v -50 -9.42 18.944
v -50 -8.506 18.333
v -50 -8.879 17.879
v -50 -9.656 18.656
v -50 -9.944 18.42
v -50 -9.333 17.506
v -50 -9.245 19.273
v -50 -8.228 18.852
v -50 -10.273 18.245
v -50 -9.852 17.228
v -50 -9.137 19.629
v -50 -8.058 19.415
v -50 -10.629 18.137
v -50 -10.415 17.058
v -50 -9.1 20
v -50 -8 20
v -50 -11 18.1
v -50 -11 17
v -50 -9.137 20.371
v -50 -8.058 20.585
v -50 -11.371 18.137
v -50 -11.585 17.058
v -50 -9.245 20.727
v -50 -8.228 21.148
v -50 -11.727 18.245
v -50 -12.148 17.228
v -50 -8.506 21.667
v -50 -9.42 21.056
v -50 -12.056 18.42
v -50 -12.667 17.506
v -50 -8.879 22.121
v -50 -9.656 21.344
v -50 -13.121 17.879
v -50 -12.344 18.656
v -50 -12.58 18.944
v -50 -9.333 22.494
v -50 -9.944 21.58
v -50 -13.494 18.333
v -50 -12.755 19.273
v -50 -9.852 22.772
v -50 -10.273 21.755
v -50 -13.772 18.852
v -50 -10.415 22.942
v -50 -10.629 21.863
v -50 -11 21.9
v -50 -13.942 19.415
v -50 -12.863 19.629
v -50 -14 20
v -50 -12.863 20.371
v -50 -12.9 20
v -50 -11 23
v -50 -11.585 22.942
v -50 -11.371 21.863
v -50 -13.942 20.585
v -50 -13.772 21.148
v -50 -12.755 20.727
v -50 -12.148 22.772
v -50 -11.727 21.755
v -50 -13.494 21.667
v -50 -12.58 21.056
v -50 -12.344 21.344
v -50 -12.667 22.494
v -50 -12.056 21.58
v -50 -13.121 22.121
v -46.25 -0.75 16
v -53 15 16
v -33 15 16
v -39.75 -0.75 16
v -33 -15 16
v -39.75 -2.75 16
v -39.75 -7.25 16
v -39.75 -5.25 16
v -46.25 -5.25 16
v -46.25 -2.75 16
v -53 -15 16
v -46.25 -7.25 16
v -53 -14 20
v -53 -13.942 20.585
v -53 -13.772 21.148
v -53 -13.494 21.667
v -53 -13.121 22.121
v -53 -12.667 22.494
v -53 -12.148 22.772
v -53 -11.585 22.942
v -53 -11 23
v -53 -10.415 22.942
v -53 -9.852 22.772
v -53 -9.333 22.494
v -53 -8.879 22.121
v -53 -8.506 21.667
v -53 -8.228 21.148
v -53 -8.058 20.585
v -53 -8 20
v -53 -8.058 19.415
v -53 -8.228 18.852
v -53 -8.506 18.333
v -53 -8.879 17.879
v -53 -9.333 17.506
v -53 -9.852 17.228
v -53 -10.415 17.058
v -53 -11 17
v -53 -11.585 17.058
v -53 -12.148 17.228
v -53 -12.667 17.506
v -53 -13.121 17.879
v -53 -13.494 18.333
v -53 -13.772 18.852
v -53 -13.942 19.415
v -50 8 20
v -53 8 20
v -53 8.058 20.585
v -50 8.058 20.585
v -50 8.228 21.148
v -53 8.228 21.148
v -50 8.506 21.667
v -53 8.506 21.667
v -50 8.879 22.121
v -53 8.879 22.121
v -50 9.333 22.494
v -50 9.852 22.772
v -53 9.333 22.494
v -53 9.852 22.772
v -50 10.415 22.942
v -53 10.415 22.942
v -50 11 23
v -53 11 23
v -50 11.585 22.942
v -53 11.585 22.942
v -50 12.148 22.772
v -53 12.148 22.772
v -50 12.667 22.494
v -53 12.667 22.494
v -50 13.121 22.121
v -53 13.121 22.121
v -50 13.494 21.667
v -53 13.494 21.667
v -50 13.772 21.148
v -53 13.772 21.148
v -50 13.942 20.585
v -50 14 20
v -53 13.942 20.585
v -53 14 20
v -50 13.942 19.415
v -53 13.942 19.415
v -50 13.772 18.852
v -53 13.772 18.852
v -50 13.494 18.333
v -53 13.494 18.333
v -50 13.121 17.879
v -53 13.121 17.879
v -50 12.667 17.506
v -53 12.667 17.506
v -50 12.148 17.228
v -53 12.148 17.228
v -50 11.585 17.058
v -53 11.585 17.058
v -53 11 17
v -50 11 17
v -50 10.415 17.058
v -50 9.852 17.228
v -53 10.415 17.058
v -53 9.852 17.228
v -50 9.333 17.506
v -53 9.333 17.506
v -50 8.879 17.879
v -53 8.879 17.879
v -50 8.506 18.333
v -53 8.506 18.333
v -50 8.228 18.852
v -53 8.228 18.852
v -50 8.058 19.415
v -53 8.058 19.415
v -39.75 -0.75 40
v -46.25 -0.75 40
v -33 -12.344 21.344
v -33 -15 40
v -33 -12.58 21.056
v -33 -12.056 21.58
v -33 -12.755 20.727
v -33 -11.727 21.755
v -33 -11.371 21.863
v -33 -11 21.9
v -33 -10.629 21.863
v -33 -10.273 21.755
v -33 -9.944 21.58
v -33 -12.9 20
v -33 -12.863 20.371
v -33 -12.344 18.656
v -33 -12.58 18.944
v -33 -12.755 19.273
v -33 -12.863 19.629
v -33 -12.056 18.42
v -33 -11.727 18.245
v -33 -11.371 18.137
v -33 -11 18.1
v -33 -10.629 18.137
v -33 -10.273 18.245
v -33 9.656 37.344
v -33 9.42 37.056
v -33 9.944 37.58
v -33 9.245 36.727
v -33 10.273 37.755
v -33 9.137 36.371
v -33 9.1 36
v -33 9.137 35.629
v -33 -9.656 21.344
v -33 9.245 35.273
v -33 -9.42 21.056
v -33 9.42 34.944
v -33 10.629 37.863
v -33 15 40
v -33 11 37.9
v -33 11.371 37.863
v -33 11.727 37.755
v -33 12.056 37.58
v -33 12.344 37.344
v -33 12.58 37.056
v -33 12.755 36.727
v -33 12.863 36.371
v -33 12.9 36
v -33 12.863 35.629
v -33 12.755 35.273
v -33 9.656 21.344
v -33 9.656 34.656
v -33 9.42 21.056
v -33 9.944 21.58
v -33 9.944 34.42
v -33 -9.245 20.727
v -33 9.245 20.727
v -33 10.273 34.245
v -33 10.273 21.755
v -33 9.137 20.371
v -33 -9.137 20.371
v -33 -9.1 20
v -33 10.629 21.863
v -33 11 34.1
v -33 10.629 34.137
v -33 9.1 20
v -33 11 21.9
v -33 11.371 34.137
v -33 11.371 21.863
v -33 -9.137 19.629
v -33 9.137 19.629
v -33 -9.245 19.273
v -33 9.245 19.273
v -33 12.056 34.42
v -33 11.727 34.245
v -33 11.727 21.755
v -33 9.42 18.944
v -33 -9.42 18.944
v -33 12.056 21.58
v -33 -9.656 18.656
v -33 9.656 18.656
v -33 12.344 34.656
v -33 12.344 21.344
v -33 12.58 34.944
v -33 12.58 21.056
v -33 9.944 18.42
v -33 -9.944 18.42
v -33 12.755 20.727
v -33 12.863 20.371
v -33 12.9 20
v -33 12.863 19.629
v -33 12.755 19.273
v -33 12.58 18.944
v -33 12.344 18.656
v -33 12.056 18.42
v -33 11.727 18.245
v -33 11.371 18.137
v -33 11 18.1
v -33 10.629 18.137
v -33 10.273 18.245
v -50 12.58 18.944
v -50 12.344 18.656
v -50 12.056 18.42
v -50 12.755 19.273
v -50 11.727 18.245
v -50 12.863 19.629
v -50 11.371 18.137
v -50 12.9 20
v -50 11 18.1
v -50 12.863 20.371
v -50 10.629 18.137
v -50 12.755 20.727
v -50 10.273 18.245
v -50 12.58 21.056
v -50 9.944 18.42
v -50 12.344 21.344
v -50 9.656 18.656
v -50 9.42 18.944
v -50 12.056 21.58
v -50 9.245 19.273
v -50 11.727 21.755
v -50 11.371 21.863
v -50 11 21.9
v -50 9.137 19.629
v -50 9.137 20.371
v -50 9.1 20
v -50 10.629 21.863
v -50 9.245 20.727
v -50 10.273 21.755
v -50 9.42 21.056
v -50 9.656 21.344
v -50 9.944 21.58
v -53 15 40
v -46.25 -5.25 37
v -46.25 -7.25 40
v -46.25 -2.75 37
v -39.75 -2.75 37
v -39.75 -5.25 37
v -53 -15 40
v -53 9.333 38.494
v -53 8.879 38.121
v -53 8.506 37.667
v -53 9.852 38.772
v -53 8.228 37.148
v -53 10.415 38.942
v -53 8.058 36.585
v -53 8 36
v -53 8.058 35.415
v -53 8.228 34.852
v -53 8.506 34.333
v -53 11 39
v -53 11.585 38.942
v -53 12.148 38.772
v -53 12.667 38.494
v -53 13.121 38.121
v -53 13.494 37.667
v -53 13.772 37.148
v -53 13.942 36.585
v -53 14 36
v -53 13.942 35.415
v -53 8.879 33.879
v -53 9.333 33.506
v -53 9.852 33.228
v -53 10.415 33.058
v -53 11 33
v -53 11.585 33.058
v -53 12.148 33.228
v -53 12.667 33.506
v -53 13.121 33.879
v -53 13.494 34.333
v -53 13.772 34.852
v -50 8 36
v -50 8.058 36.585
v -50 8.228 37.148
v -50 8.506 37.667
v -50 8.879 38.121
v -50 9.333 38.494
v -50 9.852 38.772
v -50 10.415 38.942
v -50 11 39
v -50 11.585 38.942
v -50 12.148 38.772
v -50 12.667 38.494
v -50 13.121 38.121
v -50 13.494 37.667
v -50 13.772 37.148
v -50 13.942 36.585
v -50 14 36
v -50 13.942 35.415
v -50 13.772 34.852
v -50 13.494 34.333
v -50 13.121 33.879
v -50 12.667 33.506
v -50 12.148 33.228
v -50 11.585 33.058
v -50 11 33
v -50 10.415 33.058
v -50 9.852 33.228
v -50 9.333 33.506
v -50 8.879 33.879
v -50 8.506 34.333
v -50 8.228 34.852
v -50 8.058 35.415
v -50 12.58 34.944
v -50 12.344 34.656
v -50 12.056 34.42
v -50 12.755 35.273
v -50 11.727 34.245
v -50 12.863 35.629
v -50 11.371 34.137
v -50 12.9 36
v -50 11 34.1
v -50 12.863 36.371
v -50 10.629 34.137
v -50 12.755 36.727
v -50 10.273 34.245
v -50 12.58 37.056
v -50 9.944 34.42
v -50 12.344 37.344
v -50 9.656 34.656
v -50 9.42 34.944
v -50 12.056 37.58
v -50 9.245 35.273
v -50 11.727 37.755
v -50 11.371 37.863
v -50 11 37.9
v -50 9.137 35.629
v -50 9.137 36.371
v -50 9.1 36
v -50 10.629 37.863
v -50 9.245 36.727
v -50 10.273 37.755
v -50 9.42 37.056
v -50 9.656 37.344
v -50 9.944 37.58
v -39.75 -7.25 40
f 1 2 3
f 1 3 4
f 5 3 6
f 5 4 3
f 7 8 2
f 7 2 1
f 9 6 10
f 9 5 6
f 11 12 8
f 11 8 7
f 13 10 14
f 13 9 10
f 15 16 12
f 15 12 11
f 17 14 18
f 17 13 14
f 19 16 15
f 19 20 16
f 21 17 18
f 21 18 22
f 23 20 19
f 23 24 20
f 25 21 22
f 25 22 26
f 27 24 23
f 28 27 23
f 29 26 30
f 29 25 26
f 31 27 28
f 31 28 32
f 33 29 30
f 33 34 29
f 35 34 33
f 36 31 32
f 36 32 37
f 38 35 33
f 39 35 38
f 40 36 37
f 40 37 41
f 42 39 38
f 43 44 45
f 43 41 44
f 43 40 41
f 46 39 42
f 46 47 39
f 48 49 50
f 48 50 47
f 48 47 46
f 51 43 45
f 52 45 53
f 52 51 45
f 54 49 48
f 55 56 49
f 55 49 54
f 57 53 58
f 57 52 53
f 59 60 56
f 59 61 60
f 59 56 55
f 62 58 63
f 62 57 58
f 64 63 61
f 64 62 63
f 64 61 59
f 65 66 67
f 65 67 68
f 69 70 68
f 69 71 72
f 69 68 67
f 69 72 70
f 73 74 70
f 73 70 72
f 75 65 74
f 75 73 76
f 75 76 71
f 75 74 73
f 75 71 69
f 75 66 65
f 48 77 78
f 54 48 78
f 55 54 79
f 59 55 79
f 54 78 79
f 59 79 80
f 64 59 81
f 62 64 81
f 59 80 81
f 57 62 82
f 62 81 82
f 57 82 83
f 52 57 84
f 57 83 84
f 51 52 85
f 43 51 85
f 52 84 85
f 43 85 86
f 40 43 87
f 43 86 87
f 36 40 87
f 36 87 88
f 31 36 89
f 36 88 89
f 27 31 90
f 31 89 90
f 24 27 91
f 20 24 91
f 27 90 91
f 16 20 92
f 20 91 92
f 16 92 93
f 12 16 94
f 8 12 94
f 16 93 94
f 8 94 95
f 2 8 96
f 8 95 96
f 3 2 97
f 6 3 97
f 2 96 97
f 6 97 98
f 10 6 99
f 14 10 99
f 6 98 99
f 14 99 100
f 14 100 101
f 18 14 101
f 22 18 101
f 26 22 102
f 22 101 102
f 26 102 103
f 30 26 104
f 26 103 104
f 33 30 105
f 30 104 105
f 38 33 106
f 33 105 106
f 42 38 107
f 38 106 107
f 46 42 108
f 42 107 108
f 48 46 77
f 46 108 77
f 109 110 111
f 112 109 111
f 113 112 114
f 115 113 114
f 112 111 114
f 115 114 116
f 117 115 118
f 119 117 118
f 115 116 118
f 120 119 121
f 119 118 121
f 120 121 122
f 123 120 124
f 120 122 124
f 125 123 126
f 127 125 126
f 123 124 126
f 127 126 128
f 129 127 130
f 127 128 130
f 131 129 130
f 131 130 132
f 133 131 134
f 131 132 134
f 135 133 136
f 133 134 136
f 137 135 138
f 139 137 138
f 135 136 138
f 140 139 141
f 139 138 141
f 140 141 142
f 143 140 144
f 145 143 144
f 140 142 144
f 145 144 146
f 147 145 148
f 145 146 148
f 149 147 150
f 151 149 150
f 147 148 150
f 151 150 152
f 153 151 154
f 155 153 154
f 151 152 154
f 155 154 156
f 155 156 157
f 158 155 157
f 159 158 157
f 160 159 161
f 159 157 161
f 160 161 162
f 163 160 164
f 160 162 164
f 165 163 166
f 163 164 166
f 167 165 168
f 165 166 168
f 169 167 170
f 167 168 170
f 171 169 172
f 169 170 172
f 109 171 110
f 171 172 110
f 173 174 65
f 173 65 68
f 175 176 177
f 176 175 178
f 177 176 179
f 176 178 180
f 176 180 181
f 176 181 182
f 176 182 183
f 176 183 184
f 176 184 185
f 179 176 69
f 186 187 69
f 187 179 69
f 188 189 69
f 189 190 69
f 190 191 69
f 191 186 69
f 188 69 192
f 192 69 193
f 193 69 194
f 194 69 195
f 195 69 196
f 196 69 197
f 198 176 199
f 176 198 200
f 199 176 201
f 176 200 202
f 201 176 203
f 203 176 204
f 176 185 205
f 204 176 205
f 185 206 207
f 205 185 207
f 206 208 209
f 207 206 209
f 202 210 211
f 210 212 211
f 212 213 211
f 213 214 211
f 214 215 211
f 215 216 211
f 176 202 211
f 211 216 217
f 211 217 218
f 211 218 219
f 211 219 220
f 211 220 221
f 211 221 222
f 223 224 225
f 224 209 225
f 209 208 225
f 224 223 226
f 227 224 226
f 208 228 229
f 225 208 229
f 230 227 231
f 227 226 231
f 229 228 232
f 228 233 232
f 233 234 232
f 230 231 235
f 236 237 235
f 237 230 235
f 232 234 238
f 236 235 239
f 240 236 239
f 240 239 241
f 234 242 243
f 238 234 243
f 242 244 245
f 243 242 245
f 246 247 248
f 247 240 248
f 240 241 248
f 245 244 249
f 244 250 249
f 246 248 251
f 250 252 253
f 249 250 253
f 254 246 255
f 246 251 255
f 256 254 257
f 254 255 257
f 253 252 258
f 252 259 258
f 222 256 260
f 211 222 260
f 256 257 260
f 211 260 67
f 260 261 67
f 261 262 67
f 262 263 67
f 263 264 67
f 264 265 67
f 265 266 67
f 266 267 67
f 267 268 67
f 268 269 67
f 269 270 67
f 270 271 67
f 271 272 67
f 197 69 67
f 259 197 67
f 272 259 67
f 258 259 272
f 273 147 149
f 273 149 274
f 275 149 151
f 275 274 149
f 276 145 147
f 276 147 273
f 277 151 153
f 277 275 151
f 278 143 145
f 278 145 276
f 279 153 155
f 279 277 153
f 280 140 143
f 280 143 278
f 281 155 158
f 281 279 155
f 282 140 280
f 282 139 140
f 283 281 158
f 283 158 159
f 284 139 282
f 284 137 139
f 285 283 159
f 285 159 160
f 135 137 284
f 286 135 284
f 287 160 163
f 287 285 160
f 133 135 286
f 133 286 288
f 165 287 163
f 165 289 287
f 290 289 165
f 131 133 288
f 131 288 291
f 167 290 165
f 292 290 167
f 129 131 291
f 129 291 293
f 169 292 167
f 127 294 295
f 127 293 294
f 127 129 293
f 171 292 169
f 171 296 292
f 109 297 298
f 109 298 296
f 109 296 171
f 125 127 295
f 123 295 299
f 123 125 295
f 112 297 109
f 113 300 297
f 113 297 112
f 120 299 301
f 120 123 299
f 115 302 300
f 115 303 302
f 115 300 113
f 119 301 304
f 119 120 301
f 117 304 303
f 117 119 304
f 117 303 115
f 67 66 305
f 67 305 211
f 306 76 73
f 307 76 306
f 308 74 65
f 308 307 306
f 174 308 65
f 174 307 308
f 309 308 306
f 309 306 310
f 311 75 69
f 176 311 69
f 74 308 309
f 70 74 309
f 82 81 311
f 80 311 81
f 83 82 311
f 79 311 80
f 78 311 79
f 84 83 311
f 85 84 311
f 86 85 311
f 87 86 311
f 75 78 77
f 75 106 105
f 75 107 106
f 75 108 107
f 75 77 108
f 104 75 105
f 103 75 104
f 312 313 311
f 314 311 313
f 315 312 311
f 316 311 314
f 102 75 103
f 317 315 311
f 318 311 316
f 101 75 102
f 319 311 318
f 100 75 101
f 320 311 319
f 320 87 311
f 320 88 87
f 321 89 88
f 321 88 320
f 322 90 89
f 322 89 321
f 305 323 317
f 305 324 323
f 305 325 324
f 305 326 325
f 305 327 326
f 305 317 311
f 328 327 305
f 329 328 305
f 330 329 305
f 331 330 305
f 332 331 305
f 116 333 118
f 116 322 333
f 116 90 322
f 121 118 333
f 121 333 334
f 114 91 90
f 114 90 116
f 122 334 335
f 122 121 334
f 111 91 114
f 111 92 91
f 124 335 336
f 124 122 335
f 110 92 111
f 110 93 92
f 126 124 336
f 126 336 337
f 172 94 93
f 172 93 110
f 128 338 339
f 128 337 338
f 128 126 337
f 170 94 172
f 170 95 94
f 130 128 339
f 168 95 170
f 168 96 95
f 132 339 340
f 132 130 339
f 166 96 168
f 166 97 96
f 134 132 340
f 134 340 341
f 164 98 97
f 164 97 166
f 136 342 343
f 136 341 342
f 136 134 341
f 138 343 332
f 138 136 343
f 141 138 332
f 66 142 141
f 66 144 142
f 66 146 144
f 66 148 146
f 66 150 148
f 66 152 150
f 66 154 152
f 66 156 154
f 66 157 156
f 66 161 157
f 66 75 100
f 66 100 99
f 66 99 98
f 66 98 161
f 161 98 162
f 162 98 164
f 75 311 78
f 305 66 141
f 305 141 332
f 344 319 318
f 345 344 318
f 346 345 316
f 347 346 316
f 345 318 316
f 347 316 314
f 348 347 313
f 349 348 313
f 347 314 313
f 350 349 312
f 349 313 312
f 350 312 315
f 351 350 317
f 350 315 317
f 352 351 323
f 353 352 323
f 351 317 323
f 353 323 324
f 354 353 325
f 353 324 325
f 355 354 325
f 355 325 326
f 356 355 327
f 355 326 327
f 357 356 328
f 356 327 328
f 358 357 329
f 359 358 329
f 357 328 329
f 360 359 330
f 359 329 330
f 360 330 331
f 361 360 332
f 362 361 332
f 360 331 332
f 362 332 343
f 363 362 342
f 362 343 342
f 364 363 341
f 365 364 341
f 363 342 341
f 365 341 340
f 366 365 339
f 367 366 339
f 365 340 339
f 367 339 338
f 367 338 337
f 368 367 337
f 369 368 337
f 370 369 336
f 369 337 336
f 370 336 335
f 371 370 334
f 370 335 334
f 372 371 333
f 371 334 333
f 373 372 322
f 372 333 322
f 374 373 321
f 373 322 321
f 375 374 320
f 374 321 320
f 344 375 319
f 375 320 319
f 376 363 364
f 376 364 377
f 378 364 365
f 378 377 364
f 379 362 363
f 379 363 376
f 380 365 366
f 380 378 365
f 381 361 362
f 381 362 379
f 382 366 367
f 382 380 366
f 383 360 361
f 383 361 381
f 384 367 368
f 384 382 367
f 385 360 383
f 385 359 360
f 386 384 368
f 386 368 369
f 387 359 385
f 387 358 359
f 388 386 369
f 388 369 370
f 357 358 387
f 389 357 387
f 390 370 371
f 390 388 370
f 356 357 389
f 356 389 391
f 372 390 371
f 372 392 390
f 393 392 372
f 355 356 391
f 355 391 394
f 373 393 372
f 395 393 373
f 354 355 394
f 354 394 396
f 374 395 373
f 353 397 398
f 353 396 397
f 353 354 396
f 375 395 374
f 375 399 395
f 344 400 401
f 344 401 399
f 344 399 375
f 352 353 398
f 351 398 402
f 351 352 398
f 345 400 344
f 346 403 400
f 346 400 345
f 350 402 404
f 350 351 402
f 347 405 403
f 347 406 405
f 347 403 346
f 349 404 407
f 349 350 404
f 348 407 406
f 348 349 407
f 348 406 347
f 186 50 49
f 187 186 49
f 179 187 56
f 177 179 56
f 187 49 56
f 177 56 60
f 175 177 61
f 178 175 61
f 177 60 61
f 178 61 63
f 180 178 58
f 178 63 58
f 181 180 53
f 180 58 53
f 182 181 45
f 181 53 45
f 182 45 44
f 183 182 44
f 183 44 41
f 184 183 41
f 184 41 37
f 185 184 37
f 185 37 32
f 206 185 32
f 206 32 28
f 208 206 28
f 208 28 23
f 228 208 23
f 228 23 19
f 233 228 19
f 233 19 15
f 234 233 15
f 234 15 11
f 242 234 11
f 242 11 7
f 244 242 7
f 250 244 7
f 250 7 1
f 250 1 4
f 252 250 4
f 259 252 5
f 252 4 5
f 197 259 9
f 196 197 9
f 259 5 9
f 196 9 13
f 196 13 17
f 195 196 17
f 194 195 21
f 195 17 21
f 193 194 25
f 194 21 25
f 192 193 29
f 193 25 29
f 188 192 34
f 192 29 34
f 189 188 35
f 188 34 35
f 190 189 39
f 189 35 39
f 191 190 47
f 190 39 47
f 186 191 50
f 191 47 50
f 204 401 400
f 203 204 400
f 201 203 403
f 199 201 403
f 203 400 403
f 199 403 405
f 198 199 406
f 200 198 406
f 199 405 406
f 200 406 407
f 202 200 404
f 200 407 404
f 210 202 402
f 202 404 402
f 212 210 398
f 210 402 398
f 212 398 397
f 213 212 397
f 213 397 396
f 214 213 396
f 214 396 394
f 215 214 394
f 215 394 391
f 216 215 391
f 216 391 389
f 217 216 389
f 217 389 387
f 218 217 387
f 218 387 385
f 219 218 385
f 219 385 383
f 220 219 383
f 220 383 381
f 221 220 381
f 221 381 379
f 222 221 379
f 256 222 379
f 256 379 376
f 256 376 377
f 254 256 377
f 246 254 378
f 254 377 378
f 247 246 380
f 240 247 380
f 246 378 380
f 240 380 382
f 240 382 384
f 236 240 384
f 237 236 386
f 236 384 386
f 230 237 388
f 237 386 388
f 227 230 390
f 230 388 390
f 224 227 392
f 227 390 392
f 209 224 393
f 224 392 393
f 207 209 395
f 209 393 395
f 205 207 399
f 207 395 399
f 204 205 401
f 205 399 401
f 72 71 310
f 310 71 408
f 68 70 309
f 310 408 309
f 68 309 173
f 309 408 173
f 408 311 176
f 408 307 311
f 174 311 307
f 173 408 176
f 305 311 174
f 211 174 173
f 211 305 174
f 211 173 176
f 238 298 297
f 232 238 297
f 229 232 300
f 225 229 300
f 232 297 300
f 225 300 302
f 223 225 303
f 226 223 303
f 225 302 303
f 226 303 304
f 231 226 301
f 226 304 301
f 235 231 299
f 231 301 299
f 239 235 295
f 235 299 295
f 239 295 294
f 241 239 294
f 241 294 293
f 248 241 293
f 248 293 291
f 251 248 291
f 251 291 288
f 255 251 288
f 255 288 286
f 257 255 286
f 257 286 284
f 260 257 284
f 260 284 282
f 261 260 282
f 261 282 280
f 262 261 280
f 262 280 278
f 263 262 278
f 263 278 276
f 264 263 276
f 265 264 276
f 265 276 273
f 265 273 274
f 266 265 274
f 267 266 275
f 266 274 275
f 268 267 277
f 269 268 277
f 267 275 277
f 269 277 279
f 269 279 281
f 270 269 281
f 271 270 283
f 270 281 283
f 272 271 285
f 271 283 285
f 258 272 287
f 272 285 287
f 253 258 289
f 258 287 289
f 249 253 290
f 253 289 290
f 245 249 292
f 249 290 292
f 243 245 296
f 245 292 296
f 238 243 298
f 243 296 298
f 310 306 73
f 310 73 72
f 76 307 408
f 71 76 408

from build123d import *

# Parameters (mm, degrees)
SKETCH020_W     = 20
SKETCH020_H     = 30
PAD007_DEPTH    = 40
SKETCH019_R     = 1.9
POCKET013_DEPTH = 20.001
SKETCH021_R     = 3
POCKET012_DEPTH = 3
SKETCH022_R     = 0.5
POCKET014_DEPTH = 0.5
SKETCH023_W     = 30
SKETCH023_H     = 16
POCKET015_DEPTH = 20.001
SKETCH024_W     = 6.5
SKETCH024_H     = 6.5
POCKET016_DEPTH = 3
SKETCH025_W     = 6.5
SKETCH025_H     = 2
POCKET017_DEPTH = 21.001


with BuildPart() as part:
    # Sketch020 → Pad007 (new body)
    with BuildSketch(Plane.XY):
        with Locations((-43, 0)):
            Rectangle(SKETCH020_W, SKETCH020_H)
    extrude(amount=PAD007_DEPTH)

    # Sketch019 (on Face4 of Pad007) → Pocket013 (cut, through all)
    with BuildSketch(Plane(origin=(-53, 0, 0), x_dir=(0, -1, 0), z_dir=(-1, 0, 0))):
        with Locations((-11, 36)):
            Circle(SKETCH019_R)
        with Locations((11, 20)):
            Circle(SKETCH019_R)
        with Locations((-11, 20)):
            Circle(SKETCH019_R)
        with Locations((-11, 4)):
            Circle(SKETCH019_R)
        with Locations((11, 4)):
            Circle(SKETCH019_R)
    extrude(amount=-POCKET013_DEPTH, mode=Mode.SUBTRACT)

    # Sketch021 (on Face2 of Pocket013) → Pocket012 (cut)
    with BuildSketch(Plane(origin=(-53, 0, 0), x_dir=(0, -1, 0), z_dir=(-1, 0, 0))):
        with Locations((-11, 36)):
            Circle(SKETCH021_R)
        with Locations((-11, 20)):
            Circle(SKETCH021_R)
        with Locations((-11, 4)):
            Circle(SKETCH021_R)
        with Locations((11, 4)):
            Circle(SKETCH021_R)
        with Locations((11, 20)):
            Circle(SKETCH021_R)
    extrude(amount=-POCKET012_DEPTH, mode=Mode.SUBTRACT)

    # Sketch022 (on Face5 of Pocket012) → Pocket014 (cut)
    with BuildSketch(Plane.XY.offset(40)):
        with Locations((-43, -4)):
            Circle(SKETCH022_R)
    extrude(amount=-POCKET014_DEPTH, mode=Mode.SUBTRACT)

    # Sketch023 (on Face2 of Pocket014) → Pocket015 (cut, through all)
    with BuildSketch(Plane(origin=(-53, 0, 0), x_dir=(0, -1, 0), z_dir=(-1, 0, 0))):
        with Locations((0, 8)):
            Rectangle(SKETCH023_W, SKETCH023_H)
    extrude(amount=-POCKET015_DEPTH, mode=Mode.SUBTRACT)

    # Sketch024 (on Face4 of Pocket015) → Pocket016 (cut)
    with BuildSketch(Plane.XY.offset(40)):
        with Locations((-43, -4)):
            Rectangle(SKETCH024_W, SKETCH024_H)
    extrude(amount=-POCKET016_DEPTH, mode=Mode.SUBTRACT)

    # Sketch025 (on Face20 of Pocket016) → Pocket017 (cut, through all)
    with BuildSketch(Plane.XY.offset(37)):
        with Locations((-43, -1.75)):
            Rectangle(SKETCH025_W, SKETCH025_H)
        with Locations((-43, -6.25)):
            Rectangle(SKETCH025_W, SKETCH025_H)
    extrude(amount=-POCKET017_DEPTH, mode=Mode.SUBTRACT)


solid = part.part
